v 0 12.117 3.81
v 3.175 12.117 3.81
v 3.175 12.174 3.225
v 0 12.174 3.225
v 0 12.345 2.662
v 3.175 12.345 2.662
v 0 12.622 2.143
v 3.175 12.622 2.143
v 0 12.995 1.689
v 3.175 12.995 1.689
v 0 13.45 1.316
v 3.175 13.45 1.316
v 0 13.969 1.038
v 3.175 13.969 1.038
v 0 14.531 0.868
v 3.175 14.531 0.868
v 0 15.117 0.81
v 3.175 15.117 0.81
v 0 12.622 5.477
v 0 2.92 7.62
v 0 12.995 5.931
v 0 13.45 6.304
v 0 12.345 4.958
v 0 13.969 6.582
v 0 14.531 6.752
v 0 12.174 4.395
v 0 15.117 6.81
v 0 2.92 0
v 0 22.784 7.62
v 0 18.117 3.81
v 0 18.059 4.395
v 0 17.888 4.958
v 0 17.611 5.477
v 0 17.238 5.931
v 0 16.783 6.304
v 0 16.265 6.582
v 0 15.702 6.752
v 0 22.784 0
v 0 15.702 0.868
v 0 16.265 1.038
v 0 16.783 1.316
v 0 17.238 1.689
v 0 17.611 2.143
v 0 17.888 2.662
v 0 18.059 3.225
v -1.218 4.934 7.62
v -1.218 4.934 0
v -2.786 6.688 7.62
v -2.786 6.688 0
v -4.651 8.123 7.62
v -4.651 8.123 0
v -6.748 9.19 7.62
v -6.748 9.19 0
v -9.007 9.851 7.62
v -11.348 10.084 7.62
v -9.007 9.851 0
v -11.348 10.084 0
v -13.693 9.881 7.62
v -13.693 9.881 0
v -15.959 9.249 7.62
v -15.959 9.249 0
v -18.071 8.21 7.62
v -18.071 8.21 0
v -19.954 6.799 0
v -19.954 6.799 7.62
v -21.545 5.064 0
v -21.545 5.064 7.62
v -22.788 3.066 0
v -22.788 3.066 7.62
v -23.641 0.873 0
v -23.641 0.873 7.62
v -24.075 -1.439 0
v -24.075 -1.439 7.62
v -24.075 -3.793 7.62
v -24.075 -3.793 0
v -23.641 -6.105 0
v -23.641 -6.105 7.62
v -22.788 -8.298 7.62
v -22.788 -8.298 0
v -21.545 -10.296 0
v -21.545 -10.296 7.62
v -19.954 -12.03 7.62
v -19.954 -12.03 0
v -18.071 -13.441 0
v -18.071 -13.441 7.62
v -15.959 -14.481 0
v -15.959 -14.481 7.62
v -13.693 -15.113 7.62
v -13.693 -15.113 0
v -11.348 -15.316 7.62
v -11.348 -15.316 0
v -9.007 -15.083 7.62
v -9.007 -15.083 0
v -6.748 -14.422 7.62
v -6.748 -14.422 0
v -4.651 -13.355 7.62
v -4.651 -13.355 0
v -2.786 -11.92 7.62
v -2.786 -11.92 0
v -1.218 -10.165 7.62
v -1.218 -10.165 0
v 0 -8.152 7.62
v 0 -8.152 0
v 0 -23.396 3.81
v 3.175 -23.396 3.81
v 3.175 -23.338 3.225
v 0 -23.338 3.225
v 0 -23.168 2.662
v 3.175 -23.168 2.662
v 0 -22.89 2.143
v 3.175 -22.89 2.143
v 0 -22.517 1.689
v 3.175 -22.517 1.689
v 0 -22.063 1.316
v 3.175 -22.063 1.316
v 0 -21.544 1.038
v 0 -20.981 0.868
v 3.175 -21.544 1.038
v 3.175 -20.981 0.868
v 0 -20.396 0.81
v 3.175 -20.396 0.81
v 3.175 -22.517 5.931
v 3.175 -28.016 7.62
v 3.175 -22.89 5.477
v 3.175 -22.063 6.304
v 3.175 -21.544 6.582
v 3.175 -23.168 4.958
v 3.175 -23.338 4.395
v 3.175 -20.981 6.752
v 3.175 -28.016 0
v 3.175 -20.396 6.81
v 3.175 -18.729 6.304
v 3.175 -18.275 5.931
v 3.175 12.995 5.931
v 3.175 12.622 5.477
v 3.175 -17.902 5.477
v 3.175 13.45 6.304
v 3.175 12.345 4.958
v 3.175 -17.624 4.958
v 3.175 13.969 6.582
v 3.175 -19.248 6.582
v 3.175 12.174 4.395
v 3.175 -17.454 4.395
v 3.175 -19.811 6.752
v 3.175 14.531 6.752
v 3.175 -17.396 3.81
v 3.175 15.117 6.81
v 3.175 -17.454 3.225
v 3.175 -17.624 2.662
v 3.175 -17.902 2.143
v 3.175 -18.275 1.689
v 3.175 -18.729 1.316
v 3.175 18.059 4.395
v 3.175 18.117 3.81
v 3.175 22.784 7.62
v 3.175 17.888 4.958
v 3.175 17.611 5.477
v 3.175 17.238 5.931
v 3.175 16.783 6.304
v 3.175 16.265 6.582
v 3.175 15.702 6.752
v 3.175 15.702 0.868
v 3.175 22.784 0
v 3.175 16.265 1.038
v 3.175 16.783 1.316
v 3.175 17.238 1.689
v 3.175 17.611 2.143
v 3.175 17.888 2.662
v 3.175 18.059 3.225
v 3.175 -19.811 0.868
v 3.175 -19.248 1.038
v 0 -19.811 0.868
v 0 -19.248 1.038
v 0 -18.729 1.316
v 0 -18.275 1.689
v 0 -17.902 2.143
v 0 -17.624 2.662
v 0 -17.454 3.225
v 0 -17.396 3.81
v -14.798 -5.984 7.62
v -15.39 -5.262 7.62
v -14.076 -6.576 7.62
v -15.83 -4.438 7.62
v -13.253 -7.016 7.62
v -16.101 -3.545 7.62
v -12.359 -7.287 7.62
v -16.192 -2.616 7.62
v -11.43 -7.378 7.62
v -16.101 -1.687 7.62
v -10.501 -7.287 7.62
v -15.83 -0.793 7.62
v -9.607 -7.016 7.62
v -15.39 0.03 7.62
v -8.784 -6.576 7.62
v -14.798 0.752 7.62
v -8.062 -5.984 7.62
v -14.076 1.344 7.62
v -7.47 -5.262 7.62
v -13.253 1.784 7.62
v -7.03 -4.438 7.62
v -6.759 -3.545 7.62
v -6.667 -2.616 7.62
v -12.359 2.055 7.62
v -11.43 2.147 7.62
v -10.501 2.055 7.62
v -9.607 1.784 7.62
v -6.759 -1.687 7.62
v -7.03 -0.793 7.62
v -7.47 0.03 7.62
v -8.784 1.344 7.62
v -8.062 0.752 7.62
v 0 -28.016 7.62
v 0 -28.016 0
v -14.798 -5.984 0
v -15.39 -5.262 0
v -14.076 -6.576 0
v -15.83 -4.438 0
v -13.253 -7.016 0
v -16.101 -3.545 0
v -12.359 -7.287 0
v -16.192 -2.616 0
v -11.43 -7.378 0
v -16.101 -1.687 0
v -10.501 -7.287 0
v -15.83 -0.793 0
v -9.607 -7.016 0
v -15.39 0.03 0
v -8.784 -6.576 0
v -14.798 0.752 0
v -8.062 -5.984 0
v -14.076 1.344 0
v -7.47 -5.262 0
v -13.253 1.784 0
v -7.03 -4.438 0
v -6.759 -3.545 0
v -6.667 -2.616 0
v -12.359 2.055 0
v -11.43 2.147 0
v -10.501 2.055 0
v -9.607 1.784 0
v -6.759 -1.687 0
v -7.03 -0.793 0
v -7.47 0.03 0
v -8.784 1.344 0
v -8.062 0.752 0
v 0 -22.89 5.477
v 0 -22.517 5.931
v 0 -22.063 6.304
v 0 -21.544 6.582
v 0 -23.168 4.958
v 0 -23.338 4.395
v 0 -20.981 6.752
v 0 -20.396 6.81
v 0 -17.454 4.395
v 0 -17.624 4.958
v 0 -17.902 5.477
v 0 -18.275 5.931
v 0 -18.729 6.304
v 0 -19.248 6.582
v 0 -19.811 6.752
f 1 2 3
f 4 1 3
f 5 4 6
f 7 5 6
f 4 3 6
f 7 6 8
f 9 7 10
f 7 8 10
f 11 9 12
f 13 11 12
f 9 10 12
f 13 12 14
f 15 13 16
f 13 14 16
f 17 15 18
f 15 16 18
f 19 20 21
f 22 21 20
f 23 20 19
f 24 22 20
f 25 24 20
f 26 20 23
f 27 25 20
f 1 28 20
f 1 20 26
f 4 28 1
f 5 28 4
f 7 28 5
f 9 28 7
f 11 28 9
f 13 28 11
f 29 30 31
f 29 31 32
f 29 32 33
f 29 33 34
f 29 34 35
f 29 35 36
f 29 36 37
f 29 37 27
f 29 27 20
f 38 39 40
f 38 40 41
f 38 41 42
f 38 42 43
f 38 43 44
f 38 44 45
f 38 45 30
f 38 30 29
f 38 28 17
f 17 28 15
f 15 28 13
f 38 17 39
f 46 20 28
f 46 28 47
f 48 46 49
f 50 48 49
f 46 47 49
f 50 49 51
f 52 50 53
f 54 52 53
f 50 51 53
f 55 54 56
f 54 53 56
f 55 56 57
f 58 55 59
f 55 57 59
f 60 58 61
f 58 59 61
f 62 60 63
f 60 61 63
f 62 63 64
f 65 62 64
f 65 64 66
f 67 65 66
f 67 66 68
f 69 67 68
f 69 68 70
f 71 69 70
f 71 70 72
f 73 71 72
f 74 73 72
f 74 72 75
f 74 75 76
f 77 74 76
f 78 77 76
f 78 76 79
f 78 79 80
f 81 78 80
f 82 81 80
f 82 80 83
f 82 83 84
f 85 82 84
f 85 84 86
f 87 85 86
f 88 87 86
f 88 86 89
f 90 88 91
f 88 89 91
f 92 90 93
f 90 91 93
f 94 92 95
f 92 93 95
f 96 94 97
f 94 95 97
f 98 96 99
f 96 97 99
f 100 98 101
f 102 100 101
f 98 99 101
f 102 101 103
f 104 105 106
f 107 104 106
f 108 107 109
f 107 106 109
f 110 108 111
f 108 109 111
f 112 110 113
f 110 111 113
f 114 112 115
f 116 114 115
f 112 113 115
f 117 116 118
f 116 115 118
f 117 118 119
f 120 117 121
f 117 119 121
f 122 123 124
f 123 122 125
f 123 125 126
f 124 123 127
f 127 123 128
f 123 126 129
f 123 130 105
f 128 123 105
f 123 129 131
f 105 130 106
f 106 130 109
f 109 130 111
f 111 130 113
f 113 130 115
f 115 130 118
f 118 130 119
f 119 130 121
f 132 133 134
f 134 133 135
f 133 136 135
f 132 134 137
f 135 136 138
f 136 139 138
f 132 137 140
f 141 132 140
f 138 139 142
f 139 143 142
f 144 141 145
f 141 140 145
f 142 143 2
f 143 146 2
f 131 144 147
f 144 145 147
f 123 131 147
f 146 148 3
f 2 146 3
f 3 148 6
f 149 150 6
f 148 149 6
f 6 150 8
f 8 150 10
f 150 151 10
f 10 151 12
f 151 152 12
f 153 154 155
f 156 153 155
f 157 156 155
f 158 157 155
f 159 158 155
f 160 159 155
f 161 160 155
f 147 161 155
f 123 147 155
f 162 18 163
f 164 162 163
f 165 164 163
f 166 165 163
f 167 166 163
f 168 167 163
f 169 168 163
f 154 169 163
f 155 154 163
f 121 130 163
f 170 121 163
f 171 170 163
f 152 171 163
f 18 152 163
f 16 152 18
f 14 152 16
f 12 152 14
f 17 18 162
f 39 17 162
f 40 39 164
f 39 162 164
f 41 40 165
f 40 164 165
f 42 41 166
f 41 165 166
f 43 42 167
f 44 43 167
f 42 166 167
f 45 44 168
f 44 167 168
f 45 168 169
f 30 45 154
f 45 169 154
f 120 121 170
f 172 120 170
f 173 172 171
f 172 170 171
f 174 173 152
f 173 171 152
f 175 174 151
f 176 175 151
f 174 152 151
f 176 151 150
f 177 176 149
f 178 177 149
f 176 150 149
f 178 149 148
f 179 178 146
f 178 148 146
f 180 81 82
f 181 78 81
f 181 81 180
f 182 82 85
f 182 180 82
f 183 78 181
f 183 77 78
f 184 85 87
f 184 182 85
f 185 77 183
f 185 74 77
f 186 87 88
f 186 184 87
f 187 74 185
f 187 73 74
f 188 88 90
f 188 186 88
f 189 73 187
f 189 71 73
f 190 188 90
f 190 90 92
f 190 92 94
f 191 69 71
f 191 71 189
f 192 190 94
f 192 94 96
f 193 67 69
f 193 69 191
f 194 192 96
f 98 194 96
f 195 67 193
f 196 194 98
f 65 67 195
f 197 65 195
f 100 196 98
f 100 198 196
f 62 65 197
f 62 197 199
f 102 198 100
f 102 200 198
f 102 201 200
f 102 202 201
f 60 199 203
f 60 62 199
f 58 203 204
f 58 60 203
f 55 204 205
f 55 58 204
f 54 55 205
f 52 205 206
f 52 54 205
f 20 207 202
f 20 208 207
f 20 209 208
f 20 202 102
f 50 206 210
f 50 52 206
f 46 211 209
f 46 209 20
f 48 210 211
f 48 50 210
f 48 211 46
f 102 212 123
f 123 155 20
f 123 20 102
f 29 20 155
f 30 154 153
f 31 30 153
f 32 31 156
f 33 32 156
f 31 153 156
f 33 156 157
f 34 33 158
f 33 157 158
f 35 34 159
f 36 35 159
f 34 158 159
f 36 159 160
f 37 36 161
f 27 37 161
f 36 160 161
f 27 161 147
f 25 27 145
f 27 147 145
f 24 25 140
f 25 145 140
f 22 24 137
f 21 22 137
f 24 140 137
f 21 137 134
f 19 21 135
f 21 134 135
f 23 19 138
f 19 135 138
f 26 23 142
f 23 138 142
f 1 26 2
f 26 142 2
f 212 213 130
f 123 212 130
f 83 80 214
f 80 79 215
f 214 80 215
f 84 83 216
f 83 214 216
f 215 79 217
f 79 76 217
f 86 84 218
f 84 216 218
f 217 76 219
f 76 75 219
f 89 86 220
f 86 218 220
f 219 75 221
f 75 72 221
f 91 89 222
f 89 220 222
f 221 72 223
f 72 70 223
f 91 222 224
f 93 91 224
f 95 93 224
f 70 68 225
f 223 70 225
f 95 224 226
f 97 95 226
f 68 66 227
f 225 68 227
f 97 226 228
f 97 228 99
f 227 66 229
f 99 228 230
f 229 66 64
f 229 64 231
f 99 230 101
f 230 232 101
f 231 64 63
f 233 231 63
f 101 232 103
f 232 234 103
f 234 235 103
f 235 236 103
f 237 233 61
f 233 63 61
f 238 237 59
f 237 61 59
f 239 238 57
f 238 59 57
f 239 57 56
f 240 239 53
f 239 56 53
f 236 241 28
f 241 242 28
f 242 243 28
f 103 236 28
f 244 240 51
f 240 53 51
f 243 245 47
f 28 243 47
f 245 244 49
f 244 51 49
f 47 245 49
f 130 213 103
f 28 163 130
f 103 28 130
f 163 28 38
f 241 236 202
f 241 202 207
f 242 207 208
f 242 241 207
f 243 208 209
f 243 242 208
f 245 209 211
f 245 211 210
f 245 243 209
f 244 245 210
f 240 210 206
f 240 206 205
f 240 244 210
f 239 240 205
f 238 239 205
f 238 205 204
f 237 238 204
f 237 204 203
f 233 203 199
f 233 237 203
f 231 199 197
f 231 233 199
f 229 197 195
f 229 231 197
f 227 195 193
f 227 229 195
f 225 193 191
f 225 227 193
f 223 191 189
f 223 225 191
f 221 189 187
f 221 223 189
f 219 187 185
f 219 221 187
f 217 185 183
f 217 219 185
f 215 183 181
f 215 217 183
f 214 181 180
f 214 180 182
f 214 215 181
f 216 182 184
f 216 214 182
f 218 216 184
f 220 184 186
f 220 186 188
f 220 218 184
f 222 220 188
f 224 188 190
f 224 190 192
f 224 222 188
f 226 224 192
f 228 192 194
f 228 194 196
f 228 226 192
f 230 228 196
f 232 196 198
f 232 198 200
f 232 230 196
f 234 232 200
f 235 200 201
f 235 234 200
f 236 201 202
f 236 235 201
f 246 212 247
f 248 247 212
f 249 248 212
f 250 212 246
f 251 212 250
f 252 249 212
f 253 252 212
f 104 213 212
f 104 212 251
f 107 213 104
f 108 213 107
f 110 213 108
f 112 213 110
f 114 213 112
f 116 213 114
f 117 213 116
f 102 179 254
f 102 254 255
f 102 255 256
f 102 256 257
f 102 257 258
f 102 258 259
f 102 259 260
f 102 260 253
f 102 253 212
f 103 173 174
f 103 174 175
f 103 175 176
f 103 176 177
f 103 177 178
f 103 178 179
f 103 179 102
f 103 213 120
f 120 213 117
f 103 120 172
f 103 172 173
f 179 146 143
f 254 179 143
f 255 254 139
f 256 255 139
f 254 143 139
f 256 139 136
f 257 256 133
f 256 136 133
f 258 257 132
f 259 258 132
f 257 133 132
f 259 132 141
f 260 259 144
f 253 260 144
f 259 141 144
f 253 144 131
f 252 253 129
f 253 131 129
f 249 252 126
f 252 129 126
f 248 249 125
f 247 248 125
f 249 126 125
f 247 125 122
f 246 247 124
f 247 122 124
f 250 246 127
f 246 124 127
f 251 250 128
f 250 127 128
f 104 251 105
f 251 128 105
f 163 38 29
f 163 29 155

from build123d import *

# Parameters (mm, degrees)
SKETCH1_R           = 12.7
SKETCH1_R_2         = 4.7625
SKETCH1_W           = 3.175
SKETCH1_H           = 50.8
BOSS_EXTRUDE1_DEPTH = 7.62
CUT_EXTRUDE1_DEPTH  = 7.62


with BuildPart() as part:
    # Sketch1 → Boss-Extrude1 (new body)
    # profile 1 of 2: a face of its own
    with BuildSketch(Plane.XY):
        with Locations((-11.43, -2.615954226)):
            Circle(SKETCH1_R)
        with Locations((-11.43, -2.615954226)):
            Circle(SKETCH1_R_2, mode=Mode.SUBTRACT)
    # profile 2 of 2: a face of its own
    with BuildSketch(Plane.XY):
        with Locations((1.5875, -2.615954226)):
            Rectangle(SKETCH1_W, SKETCH1_H)
    extrude(amount=BOSS_EXTRUDE1_DEPTH)

    # Sketch3 → Cut-Extrude1 (cut)
    with BuildSketch(Plane(origin=(5.715, 0, 0), x_dir=(0, 0, -1), z_dir=(1, 0, 0))):
        with BuildLine():
            ThreePointArc((-0.81, 15.116671426), (-1.688679656, 17.237991769), (-3.81, 18.116671426))
            Line((-3.81, 18.116671426), (-3.81, 15.116671426))
            Line((-3.81, 15.116671426), (-3.81, 12.116671426))
            ThreePointArc((-3.81, 12.116671426), (-1.688679656, 12.995351082), (-0.81, 15.116671426))
        make_face()
        with BuildLine():
            Line((-3.81, 15.116671426), (-3.81, 18.116671426))
            ThreePointArc((-3.81, 18.116671426), (-6.81, 15.116671426), (-3.81, 12.116671426))
            Line((-3.81, 12.116671426), (-3.81, 15.116671426))
        make_face()
        with BuildLine():
            ThreePointArc((-0.81, -20.395954226), (-1.688679656, -18.274633882), (-3.81, -17.395954226))
            Line((-3.81, -17.395954226), (-3.81, -20.395954226))
            Line((-3.81, -20.395954226), (-3.81, -23.395954226))
            ThreePointArc((-3.81, -23.395954226), (-1.688679656, -22.517274569), (-0.81, -20.395954226))
        make_face()
        with BuildLine():
            Line((-3.81, -20.395954226), (-3.81, -17.395954226))
            ThreePointArc((-3.81, -17.395954226), (-6.81, -20.395954226), (-3.81, -23.395954226))
            Line((-3.81, -23.395954226), (-3.81, -20.395954226))
        make_face()
    extrude(amount=-CUT_EXTRUDE1_DEPTH, mode=Mode.SUBTRACT)


solid = part.part
